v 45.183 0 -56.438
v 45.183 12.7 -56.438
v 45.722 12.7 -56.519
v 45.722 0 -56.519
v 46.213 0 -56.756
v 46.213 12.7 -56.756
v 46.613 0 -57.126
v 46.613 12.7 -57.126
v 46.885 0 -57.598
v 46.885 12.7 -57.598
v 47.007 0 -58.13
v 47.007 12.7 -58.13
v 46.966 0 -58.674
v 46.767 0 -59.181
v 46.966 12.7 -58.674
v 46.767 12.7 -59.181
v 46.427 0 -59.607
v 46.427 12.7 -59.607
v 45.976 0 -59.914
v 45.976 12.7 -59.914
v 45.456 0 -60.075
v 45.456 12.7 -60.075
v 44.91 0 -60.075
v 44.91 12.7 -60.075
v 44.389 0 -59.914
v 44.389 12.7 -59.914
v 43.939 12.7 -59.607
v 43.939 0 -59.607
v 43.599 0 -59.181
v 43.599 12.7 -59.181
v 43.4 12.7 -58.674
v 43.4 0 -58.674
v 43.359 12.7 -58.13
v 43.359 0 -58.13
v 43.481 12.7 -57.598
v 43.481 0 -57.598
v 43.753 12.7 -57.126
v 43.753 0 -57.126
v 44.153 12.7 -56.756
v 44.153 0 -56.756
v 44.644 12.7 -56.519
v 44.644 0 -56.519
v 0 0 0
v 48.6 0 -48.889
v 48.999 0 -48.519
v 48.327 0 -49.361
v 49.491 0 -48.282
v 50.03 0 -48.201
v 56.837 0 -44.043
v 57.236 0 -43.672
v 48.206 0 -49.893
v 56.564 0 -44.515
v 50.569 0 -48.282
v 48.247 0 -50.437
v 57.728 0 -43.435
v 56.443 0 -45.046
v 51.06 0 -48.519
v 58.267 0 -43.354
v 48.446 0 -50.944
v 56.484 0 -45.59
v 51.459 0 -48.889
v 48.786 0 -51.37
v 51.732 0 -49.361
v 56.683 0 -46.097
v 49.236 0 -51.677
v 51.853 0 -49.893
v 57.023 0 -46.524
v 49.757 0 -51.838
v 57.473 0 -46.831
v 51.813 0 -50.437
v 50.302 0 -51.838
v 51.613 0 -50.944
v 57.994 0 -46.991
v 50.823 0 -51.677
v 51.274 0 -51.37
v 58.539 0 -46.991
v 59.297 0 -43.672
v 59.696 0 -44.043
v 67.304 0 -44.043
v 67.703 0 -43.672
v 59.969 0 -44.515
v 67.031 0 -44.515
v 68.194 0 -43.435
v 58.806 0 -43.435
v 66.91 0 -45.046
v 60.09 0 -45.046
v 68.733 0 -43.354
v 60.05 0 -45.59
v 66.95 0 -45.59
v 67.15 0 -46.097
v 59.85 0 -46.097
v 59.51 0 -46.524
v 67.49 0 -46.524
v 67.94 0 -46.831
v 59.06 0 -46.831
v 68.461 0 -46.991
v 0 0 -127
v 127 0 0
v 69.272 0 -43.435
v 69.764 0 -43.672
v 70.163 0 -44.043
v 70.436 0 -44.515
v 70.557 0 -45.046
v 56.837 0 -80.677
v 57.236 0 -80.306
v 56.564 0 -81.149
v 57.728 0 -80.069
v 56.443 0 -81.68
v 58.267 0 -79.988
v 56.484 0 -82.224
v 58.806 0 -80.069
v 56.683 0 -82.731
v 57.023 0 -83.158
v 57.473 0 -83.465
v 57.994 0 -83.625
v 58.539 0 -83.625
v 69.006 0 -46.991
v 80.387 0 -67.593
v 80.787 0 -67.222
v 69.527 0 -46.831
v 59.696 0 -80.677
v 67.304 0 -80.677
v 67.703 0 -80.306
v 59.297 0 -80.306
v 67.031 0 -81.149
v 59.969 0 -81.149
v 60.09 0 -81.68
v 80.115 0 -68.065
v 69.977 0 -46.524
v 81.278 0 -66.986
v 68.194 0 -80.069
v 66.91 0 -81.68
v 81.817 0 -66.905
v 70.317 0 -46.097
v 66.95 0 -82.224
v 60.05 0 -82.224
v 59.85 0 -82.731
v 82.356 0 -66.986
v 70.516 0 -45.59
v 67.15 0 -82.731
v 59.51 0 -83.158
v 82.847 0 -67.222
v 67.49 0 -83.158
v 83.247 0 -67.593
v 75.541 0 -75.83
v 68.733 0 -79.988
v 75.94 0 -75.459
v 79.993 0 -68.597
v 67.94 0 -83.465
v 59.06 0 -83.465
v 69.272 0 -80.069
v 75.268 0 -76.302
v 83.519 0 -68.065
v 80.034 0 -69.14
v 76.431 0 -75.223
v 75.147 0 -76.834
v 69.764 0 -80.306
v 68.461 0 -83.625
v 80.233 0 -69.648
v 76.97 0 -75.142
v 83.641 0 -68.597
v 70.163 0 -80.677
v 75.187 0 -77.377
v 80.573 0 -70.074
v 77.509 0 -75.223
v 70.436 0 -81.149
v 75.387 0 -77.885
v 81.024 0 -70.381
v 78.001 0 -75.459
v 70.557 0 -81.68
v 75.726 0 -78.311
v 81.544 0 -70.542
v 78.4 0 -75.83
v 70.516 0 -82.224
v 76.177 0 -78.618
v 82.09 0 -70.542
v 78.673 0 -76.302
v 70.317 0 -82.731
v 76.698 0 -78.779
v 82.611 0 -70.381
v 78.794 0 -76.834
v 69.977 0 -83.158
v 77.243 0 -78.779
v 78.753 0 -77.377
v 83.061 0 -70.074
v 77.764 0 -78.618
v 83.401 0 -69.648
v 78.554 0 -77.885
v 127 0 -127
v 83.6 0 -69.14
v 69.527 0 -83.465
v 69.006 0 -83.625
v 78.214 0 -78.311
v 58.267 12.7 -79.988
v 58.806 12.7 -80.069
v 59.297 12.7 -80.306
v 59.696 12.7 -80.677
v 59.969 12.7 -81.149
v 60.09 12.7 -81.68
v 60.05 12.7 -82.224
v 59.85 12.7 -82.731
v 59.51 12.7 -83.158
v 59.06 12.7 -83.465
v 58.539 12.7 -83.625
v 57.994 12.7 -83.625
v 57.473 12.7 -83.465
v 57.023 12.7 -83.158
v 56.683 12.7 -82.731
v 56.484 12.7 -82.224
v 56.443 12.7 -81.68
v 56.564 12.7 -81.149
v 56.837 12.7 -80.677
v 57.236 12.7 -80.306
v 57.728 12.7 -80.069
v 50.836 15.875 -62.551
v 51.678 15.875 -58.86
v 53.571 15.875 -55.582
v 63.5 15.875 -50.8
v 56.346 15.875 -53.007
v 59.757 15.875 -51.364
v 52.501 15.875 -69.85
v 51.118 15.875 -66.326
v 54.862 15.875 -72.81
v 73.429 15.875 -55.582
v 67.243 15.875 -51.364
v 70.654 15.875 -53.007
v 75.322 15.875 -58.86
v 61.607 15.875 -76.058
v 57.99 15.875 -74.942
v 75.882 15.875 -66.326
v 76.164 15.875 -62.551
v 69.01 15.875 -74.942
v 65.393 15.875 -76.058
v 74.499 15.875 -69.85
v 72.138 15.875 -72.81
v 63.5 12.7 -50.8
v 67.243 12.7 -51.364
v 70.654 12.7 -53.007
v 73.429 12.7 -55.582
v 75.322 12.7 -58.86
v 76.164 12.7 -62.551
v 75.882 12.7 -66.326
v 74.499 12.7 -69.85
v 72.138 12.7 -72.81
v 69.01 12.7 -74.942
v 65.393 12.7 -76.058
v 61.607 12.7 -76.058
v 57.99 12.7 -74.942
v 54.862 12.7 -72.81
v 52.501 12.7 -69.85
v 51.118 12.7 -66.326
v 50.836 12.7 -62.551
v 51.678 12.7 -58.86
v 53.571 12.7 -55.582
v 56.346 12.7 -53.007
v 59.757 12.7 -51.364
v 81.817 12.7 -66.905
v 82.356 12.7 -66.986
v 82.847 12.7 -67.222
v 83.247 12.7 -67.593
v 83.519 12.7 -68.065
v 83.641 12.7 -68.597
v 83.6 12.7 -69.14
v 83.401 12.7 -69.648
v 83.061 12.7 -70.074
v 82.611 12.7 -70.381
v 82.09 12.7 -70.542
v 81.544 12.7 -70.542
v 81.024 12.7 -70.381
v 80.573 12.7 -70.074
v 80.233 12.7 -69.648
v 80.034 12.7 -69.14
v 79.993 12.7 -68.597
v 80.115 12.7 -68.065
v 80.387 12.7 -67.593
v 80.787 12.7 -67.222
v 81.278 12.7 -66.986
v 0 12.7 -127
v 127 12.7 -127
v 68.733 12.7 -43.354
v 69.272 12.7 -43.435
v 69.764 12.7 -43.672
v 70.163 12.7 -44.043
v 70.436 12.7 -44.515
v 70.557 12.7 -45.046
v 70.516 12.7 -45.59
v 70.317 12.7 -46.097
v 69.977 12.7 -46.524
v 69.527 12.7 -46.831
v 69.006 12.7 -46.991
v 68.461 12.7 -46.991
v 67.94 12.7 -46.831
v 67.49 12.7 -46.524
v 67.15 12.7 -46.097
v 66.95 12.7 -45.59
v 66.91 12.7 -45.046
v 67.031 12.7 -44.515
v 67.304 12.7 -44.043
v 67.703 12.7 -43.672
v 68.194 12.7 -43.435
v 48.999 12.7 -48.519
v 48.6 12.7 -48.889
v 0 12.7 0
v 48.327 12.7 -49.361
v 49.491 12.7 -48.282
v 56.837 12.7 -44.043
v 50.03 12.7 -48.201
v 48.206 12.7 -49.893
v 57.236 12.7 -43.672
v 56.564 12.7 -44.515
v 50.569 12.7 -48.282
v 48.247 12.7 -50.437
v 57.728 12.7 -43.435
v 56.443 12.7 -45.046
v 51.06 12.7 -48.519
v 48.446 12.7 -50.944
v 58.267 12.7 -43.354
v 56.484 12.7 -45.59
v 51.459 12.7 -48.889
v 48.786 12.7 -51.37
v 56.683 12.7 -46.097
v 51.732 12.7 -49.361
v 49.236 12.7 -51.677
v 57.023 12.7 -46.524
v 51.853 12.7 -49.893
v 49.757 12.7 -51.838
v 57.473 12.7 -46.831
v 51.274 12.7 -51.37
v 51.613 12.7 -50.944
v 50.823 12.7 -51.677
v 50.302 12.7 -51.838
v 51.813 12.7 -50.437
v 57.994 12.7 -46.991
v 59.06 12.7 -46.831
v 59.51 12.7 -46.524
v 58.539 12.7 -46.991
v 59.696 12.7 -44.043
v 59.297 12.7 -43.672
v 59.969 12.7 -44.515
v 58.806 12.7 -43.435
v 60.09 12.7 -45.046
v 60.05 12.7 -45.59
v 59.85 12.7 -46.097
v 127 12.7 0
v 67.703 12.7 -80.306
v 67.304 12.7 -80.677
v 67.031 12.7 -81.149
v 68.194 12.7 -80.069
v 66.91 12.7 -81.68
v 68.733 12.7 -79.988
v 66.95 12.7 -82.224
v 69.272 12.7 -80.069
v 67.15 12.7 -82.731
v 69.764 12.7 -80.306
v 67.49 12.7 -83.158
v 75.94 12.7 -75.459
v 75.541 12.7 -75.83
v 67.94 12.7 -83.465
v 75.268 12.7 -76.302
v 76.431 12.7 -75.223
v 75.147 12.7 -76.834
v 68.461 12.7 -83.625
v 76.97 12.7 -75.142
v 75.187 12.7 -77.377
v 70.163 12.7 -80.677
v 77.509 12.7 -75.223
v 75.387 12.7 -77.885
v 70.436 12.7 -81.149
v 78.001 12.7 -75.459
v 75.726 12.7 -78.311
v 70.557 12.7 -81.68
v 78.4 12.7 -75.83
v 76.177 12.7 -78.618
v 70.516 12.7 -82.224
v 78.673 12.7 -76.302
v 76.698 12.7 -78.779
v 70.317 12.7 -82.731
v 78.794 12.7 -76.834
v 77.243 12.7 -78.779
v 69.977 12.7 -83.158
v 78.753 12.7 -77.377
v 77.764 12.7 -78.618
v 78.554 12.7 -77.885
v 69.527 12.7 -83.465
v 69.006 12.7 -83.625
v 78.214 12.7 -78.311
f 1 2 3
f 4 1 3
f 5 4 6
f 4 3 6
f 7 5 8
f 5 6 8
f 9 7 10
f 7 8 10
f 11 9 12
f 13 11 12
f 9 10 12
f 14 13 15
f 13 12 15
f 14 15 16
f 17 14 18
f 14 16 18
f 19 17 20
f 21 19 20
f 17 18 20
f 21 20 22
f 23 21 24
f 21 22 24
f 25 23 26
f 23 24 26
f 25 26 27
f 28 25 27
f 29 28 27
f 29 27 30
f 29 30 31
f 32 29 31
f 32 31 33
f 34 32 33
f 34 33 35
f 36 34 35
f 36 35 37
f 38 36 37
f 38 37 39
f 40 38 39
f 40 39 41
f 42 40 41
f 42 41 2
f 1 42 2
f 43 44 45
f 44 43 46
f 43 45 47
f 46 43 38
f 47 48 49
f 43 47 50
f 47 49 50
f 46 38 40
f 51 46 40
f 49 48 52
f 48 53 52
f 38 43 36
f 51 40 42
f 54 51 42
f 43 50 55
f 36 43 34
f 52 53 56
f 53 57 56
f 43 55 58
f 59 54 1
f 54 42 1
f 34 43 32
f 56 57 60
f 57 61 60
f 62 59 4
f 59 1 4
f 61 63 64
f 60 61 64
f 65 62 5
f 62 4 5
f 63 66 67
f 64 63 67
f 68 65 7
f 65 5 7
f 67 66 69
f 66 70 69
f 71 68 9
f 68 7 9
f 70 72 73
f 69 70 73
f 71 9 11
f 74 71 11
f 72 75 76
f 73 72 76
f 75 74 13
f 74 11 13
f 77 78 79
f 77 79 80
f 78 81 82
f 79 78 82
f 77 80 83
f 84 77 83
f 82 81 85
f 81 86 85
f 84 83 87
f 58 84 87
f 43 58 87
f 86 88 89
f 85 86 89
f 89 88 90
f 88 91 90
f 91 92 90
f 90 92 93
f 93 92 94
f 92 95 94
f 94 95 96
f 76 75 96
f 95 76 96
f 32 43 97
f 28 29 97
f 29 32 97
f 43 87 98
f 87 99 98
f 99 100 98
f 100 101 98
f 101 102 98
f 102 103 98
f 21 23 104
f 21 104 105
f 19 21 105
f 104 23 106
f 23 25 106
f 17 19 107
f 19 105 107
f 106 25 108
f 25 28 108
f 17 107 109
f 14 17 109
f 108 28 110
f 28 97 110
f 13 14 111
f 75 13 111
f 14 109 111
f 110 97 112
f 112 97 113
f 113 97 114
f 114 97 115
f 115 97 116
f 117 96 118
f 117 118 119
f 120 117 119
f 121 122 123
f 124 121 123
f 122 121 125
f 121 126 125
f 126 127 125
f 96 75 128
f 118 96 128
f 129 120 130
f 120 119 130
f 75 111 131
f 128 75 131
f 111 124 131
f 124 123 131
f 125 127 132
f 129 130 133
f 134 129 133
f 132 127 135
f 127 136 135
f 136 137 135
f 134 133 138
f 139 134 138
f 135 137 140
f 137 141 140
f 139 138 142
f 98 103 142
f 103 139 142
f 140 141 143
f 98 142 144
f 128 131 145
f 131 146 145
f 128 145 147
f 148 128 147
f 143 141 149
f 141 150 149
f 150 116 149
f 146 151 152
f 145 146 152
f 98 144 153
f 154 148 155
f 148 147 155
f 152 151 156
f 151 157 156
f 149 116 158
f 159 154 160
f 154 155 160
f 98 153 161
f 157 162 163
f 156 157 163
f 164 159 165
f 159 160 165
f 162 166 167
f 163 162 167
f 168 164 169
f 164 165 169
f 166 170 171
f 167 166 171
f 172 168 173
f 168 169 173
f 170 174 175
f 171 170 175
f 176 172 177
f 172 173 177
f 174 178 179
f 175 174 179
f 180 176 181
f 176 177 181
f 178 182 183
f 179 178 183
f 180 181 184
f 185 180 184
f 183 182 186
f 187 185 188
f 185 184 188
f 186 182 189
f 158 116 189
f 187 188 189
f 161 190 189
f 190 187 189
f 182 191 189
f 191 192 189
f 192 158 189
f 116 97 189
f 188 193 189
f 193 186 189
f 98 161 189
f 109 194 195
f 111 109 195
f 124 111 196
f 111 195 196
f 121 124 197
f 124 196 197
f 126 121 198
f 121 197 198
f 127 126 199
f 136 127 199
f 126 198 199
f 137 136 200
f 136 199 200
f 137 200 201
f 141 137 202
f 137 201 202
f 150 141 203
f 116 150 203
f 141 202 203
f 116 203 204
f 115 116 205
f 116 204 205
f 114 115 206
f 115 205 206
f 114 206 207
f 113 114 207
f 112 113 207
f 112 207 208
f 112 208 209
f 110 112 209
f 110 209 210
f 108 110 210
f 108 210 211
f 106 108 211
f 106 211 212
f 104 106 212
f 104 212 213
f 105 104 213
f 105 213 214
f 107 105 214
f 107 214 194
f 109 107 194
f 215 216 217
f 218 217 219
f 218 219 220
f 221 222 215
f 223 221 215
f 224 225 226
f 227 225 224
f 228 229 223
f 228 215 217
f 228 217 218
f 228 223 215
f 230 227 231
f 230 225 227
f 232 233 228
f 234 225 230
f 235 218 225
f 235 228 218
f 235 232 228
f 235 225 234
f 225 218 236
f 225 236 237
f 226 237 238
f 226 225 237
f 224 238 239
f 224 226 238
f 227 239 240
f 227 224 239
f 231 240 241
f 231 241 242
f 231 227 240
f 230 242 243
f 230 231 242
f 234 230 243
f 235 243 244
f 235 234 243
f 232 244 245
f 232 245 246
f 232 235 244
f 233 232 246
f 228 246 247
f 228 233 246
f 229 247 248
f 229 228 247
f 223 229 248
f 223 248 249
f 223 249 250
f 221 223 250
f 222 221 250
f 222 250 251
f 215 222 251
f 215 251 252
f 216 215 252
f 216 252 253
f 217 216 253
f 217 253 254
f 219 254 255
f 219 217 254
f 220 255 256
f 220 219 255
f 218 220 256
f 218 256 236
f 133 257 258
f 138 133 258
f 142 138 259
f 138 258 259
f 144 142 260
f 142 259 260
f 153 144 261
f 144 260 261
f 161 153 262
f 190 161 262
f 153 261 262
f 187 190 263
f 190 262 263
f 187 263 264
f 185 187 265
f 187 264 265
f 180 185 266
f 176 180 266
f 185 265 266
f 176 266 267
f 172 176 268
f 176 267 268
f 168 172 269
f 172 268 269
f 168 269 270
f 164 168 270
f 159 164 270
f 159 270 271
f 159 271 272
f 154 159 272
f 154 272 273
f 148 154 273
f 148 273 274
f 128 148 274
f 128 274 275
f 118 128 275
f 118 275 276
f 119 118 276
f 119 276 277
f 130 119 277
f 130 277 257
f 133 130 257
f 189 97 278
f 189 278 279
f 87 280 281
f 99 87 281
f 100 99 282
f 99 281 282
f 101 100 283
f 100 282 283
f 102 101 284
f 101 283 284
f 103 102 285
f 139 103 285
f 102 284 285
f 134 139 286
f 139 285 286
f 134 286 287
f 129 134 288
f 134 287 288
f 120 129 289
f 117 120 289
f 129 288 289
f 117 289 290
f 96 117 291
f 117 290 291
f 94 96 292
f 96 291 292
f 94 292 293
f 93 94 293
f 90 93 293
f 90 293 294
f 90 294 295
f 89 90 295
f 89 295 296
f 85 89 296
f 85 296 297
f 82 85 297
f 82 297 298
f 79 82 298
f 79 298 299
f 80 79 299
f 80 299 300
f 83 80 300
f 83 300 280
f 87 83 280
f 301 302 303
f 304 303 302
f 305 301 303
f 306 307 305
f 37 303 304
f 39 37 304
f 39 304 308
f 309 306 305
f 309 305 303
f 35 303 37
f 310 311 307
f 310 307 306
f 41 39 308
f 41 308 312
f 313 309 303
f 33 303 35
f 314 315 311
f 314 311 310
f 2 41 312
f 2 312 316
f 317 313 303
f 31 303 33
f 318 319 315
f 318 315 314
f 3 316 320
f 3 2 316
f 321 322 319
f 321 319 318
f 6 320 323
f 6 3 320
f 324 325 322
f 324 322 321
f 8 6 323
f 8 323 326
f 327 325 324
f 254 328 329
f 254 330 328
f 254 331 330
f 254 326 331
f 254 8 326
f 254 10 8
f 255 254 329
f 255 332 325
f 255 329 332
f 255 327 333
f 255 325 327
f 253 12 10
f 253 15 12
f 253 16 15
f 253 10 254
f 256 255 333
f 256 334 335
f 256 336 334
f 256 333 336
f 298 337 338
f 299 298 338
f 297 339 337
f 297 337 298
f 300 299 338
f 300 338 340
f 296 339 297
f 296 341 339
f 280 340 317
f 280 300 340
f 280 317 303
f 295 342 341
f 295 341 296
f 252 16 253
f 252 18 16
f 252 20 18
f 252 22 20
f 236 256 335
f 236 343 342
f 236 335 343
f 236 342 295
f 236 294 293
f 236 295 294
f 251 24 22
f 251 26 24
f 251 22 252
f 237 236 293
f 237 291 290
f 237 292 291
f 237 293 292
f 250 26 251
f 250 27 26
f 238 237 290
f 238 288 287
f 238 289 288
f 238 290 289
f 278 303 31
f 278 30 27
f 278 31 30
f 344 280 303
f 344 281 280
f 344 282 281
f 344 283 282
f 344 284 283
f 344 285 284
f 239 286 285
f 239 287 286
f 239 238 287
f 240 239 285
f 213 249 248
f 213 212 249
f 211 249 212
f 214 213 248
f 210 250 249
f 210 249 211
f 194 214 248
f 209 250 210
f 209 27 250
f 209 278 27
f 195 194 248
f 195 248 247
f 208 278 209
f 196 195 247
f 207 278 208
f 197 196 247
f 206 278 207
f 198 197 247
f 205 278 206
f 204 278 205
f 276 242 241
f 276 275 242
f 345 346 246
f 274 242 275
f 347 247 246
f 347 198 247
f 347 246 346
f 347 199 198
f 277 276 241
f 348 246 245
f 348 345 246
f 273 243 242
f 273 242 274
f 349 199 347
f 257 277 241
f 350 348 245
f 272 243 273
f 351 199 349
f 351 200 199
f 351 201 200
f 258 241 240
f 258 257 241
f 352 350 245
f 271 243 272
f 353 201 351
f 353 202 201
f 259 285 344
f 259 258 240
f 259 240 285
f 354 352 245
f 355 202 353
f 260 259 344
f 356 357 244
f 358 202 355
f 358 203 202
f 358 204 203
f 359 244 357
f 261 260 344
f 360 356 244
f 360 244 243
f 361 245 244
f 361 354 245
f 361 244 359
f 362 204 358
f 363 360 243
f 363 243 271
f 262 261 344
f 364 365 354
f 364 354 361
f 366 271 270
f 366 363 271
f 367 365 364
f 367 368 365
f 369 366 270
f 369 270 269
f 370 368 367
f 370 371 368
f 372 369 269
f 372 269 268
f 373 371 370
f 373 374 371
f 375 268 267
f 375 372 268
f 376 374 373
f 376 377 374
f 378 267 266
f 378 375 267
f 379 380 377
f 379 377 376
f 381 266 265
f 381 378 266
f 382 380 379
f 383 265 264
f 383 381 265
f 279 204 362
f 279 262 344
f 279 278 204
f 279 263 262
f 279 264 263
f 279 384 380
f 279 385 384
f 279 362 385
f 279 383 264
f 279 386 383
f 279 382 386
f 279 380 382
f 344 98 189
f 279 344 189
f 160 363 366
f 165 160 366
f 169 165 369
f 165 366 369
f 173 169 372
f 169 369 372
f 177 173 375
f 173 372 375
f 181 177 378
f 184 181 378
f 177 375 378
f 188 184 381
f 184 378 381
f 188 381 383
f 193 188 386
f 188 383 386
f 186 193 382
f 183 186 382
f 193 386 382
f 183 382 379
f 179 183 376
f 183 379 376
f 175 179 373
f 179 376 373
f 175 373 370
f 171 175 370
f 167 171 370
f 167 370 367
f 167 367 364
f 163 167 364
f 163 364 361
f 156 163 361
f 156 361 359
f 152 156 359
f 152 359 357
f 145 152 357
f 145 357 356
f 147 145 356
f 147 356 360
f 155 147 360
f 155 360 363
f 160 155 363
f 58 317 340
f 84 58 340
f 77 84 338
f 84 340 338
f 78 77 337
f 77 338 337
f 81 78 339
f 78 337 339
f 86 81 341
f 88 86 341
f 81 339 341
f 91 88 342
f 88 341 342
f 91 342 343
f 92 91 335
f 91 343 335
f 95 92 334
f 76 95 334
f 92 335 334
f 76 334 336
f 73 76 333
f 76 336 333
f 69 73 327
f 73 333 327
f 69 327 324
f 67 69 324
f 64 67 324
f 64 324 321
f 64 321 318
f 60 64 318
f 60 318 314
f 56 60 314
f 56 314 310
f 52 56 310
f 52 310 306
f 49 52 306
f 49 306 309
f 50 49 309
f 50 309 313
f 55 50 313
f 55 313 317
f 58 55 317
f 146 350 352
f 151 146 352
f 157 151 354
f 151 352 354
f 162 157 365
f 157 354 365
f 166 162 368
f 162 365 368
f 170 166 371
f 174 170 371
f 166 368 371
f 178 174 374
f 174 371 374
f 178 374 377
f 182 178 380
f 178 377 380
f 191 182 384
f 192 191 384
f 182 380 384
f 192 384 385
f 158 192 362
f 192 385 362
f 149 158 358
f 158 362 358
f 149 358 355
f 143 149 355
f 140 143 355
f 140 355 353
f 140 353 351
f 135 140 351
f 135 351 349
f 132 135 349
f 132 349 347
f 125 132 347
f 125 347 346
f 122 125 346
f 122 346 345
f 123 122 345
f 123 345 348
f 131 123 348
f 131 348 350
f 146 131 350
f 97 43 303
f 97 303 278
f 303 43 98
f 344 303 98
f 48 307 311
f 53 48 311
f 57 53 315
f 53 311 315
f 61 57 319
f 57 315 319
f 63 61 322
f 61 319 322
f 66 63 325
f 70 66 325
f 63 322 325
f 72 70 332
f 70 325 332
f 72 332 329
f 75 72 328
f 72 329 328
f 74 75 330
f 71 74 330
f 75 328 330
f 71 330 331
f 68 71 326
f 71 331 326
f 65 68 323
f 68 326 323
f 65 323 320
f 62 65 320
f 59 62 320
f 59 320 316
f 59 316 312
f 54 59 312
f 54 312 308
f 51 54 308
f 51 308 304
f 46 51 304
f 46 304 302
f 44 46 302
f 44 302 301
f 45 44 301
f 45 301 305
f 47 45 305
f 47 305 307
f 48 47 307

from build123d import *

# Parameters (mm, degrees)
SKETCH3_W           = 127
SKETCH3_H           = 127
BOSS_EXTRUDE1_DEPTH = 15.875
SKETCH4_W           = 127
SKETCH4_H           = 127
SKETCH4_R           = 12.7
CUT_EXTRUDE1_DEPTH  = 3.175
CUT_EXTRUDE2_REACH  = 182.054
SKETCH5_R           = 1.8288
CUT_EXTRUDE3_REACH  = 182.054
SKETCH9_R           = 1.8288
CUT_EXTRUDE4_REACH  = 182.054
SKETCH10_R          = 1.8288


with BuildPart() as part:
    # Sketch3 → Boss-Extrude1 (new body)
    with BuildSketch(Plane(origin=(0, 0, 0), x_dir=(1, 0, 0), z_dir=(0, 1, 0))):
        with Locations((63.5, 63.5)):
            Rectangle(SKETCH3_W, SKETCH3_H)
    extrude(amount=BOSS_EXTRUDE1_DEPTH)

    # Sketch4 → Cut-Extrude1 (cut)
    with BuildSketch(Plane(origin=(0, 15.875, 0), x_dir=(1, 0, 0), z_dir=(0, 1, 0))):
        with Locations((63.5, 63.5)):
            Rectangle(SKETCH4_W, SKETCH4_H)
        with Locations((63.5, 63.5)):
            Circle(SKETCH4_R, mode=Mode.SUBTRACT)
    extrude(amount=-CUT_EXTRUDE1_DEPTH, mode=Mode.SUBTRACT)

    # Sketch5 → Cut-Extrude2 (cut, up to next)
    with BuildSketch(Plane(origin=(0, 12.7, 0), x_dir=(1, 0, 0), z_dir=(0, 1, 0)), mode=Mode.PRIVATE) as cut_extrude2_sk1:
        with Locations((45.182968797, 58.266562514)):
            Circle(SKETCH5_R)
    cut_extrude2_tool1 = extrude(cut_extrude2_sk1.sketch, amount=-CUT_EXTRUDE2_REACH, mode=Mode.PRIVATE) & part.part
    # Sketch5 → Cut-Extrude2 (cut, up to next)
    with BuildSketch(Plane(origin=(0, 12.7, 0), x_dir=(1, 0, 0), z_dir=(0, 1, 0)), mode=Mode.PRIVATE) as cut_extrude2_sk2:
        with Locations((68.733437486, 45.182968797)):
            Circle(SKETCH5_R)
    cut_extrude2_tool2 = extrude(cut_extrude2_sk2.sketch, amount=-CUT_EXTRUDE2_REACH, mode=Mode.PRIVATE) & part.part
    # Sketch5 → Cut-Extrude2 (cut, up to next)
    with BuildSketch(Plane(origin=(0, 12.7, 0), x_dir=(1, 0, 0), z_dir=(0, 1, 0)), mode=Mode.PRIVATE) as cut_extrude2_sk3:
        with Locations((81.817031203, 68.733437486)):
            Circle(SKETCH5_R)
    cut_extrude2_tool3 = extrude(cut_extrude2_sk3.sketch, amount=-CUT_EXTRUDE2_REACH, mode=Mode.PRIVATE) & part.part
    # Sketch5 → Cut-Extrude2 (cut, up to next)
    with BuildSketch(Plane(origin=(0, 12.7, 0), x_dir=(1, 0, 0), z_dir=(0, 1, 0)), mode=Mode.PRIVATE) as cut_extrude2_sk4:
        with Locations((58.266562514, 81.817031203)):
            Circle(SKETCH5_R)
    cut_extrude2_tool4 = extrude(cut_extrude2_sk4.sketch, amount=-CUT_EXTRUDE2_REACH, mode=Mode.PRIVATE) & part.part
    add(cut_extrude2_tool1.solids().sort_by_distance((45.182969, 12.7, -58.266563))[0], mode=Mode.SUBTRACT)
    add(cut_extrude2_tool2.solids().sort_by_distance((68.733437, 12.7, -45.182969))[0], mode=Mode.SUBTRACT)
    add(cut_extrude2_tool3.solids().sort_by_distance((81.817031, 12.7, -68.733437))[0], mode=Mode.SUBTRACT)
    add(cut_extrude2_tool4.solids().sort_by_distance((58.266563, 12.7, -81.817031))[0], mode=Mode.SUBTRACT)

    # Sketch9 → Cut-Extrude3 (cut, up to next)
    with BuildSketch(Plane(origin=(0, 12.7, 0), x_dir=(1, 0, 0), z_dir=(0, 1, 0)), mode=Mode.PRIVATE) as cut_extrude3_sk1:
        with Locations((68.733437486, 81.817031203)):
            Circle(SKETCH9_R)
    cut_extrude3_tool1 = extrude(cut_extrude3_sk1.sketch, amount=-CUT_EXTRUDE3_REACH, mode=Mode.PRIVATE) & part.part
    # Sketch9 → Cut-Extrude3 (cut, up to next)
    with BuildSketch(Plane(origin=(0, 12.7, 0), x_dir=(1, 0, 0), z_dir=(0, 1, 0)), mode=Mode.PRIVATE) as cut_extrude3_sk2:
        with Locations((58.266562514, 45.182968797)):
            Circle(SKETCH9_R)
    cut_extrude3_tool2 = extrude(cut_extrude3_sk2.sketch, amount=-CUT_EXTRUDE3_REACH, mode=Mode.PRIVATE) & part.part
    add(cut_extrude3_tool1.solids().sort_by_distance((68.733437, 12.7, -81.817031))[0], mode=Mode.SUBTRACT)
    add(cut_extrude3_tool2.solids().sort_by_distance((58.266563, 12.7, -45.182969))[0], mode=Mode.SUBTRACT)

    # Sketch10 → Cut-Extrude4 (cut, up to next)
    with BuildSketch(Plane(origin=(0, 12.7, 0), x_dir=(1, 0, 0), z_dir=(0, 1, 0)), mode=Mode.PRIVATE) as cut_extrude4_sk1:
        with Locations((76.970384182, 76.970384182)):
            Circle(SKETCH10_R)
    cut_extrude4_tool1 = extrude(cut_extrude4_sk1.sketch, amount=-CUT_EXTRUDE4_REACH, mode=Mode.PRIVATE) & part.part
    # Sketch10 → Cut-Extrude4 (cut, up to next)
    with BuildSketch(Plane(origin=(0, 12.7, 0), x_dir=(1, 0, 0), z_dir=(0, 1, 0)), mode=Mode.PRIVATE) as cut_extrude4_sk2:
        with Locations((50.029615818, 50.029615818)):
            Circle(SKETCH10_R)
    cut_extrude4_tool2 = extrude(cut_extrude4_sk2.sketch, amount=-CUT_EXTRUDE4_REACH, mode=Mode.PRIVATE) & part.part
    add(cut_extrude4_tool1.solids().sort_by_distance((76.970384, 12.7, -76.970384))[0], mode=Mode.SUBTRACT)
    add(cut_extrude4_tool2.solids().sort_by_distance((50.029616, 12.7, -50.029616))[0], mode=Mode.SUBTRACT)


solid = part.part
